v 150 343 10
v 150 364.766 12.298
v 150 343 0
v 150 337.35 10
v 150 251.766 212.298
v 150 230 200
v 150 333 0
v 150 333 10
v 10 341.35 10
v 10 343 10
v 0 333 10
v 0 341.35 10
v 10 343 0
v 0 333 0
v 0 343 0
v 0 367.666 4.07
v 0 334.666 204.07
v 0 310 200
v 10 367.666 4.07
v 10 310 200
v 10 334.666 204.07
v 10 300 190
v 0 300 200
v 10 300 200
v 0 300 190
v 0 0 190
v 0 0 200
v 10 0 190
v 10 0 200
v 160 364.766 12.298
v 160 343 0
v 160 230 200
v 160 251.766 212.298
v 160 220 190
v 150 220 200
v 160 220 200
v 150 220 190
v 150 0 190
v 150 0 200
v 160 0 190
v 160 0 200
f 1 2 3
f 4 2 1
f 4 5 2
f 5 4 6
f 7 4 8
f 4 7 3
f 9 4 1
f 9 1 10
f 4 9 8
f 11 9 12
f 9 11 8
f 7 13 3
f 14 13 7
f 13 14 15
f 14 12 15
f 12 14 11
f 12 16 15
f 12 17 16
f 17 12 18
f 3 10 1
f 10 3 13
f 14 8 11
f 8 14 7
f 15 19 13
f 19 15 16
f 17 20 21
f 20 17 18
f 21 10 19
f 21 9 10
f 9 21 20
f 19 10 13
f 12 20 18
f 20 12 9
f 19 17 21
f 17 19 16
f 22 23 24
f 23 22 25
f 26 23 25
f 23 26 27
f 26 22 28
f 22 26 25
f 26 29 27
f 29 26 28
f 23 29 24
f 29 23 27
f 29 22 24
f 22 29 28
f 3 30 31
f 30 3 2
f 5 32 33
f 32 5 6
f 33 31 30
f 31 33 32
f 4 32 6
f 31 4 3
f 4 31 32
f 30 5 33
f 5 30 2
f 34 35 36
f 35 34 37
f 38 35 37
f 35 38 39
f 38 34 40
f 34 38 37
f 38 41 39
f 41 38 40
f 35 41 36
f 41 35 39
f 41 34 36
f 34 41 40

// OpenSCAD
// Massstab 1 entspricht einem cm

function beamLength(height, depth) = sqrt( 
		pow(depth, 2) + 
		pow(height, 2));

function beamAngle(depth, length) = acos(depth / length);


module porch(width, height, depth, leftPillarHeight, 
	rightPillarHeight, pillarColor, roofColor) {

	leftLength = beamLength(depth, 
		height - leftPillarHeight);
	leftAngle = beamAngle(depth, 
		leftLength);

	rightLength = beamLength(depth, 
		height - rightPillarHeight);
	rightAngle = beamAngle(depth, 
		rightLength);

	// wooden construction
	color(pillarColor) {
		// base	
		translate([0, height, 0])
			cube([width, 10, 10]);

	// left side
	translate([10, height + 10, 0])
		rotate([0, 270, 0])
			rotate([0, 0, -leftAngle])
				cube([leftLength, 25, 10]);

	translate([0, 0, depth])
		rotate([270, 0, 0])
		cube([10, 10, leftPillarHeight]);

	// right side
	translate([10 + width, height + 10, 0])
		rotate([0, 270, 0])
			rotate([0, 0, -rightAngle])
				cube([rightLength, 25, 10]);

	translate([width, 0, depth])
		rotate([270, 0, 0])
		cube([10, 10, rightPillarHeight]);
	}

	
	// the roof
	color(roofColor)
	polyhedron ( points = [
				[0, height + 10 + 25, 0], 
				[0, leftPillarHeight + 10 + 25, depth], 
				[width, rightPillarHeight + 10 + 25, depth], 
				[width, height + 10 + 25, 0],], 
				triangles = [
					[2, 1, 0], 
					[3, 2, 0],]);
}


sandColor = [ 247/255, 231/255, 194/255 ];
porch(150, 103 + 220 + 10, 200, 300, 220);
